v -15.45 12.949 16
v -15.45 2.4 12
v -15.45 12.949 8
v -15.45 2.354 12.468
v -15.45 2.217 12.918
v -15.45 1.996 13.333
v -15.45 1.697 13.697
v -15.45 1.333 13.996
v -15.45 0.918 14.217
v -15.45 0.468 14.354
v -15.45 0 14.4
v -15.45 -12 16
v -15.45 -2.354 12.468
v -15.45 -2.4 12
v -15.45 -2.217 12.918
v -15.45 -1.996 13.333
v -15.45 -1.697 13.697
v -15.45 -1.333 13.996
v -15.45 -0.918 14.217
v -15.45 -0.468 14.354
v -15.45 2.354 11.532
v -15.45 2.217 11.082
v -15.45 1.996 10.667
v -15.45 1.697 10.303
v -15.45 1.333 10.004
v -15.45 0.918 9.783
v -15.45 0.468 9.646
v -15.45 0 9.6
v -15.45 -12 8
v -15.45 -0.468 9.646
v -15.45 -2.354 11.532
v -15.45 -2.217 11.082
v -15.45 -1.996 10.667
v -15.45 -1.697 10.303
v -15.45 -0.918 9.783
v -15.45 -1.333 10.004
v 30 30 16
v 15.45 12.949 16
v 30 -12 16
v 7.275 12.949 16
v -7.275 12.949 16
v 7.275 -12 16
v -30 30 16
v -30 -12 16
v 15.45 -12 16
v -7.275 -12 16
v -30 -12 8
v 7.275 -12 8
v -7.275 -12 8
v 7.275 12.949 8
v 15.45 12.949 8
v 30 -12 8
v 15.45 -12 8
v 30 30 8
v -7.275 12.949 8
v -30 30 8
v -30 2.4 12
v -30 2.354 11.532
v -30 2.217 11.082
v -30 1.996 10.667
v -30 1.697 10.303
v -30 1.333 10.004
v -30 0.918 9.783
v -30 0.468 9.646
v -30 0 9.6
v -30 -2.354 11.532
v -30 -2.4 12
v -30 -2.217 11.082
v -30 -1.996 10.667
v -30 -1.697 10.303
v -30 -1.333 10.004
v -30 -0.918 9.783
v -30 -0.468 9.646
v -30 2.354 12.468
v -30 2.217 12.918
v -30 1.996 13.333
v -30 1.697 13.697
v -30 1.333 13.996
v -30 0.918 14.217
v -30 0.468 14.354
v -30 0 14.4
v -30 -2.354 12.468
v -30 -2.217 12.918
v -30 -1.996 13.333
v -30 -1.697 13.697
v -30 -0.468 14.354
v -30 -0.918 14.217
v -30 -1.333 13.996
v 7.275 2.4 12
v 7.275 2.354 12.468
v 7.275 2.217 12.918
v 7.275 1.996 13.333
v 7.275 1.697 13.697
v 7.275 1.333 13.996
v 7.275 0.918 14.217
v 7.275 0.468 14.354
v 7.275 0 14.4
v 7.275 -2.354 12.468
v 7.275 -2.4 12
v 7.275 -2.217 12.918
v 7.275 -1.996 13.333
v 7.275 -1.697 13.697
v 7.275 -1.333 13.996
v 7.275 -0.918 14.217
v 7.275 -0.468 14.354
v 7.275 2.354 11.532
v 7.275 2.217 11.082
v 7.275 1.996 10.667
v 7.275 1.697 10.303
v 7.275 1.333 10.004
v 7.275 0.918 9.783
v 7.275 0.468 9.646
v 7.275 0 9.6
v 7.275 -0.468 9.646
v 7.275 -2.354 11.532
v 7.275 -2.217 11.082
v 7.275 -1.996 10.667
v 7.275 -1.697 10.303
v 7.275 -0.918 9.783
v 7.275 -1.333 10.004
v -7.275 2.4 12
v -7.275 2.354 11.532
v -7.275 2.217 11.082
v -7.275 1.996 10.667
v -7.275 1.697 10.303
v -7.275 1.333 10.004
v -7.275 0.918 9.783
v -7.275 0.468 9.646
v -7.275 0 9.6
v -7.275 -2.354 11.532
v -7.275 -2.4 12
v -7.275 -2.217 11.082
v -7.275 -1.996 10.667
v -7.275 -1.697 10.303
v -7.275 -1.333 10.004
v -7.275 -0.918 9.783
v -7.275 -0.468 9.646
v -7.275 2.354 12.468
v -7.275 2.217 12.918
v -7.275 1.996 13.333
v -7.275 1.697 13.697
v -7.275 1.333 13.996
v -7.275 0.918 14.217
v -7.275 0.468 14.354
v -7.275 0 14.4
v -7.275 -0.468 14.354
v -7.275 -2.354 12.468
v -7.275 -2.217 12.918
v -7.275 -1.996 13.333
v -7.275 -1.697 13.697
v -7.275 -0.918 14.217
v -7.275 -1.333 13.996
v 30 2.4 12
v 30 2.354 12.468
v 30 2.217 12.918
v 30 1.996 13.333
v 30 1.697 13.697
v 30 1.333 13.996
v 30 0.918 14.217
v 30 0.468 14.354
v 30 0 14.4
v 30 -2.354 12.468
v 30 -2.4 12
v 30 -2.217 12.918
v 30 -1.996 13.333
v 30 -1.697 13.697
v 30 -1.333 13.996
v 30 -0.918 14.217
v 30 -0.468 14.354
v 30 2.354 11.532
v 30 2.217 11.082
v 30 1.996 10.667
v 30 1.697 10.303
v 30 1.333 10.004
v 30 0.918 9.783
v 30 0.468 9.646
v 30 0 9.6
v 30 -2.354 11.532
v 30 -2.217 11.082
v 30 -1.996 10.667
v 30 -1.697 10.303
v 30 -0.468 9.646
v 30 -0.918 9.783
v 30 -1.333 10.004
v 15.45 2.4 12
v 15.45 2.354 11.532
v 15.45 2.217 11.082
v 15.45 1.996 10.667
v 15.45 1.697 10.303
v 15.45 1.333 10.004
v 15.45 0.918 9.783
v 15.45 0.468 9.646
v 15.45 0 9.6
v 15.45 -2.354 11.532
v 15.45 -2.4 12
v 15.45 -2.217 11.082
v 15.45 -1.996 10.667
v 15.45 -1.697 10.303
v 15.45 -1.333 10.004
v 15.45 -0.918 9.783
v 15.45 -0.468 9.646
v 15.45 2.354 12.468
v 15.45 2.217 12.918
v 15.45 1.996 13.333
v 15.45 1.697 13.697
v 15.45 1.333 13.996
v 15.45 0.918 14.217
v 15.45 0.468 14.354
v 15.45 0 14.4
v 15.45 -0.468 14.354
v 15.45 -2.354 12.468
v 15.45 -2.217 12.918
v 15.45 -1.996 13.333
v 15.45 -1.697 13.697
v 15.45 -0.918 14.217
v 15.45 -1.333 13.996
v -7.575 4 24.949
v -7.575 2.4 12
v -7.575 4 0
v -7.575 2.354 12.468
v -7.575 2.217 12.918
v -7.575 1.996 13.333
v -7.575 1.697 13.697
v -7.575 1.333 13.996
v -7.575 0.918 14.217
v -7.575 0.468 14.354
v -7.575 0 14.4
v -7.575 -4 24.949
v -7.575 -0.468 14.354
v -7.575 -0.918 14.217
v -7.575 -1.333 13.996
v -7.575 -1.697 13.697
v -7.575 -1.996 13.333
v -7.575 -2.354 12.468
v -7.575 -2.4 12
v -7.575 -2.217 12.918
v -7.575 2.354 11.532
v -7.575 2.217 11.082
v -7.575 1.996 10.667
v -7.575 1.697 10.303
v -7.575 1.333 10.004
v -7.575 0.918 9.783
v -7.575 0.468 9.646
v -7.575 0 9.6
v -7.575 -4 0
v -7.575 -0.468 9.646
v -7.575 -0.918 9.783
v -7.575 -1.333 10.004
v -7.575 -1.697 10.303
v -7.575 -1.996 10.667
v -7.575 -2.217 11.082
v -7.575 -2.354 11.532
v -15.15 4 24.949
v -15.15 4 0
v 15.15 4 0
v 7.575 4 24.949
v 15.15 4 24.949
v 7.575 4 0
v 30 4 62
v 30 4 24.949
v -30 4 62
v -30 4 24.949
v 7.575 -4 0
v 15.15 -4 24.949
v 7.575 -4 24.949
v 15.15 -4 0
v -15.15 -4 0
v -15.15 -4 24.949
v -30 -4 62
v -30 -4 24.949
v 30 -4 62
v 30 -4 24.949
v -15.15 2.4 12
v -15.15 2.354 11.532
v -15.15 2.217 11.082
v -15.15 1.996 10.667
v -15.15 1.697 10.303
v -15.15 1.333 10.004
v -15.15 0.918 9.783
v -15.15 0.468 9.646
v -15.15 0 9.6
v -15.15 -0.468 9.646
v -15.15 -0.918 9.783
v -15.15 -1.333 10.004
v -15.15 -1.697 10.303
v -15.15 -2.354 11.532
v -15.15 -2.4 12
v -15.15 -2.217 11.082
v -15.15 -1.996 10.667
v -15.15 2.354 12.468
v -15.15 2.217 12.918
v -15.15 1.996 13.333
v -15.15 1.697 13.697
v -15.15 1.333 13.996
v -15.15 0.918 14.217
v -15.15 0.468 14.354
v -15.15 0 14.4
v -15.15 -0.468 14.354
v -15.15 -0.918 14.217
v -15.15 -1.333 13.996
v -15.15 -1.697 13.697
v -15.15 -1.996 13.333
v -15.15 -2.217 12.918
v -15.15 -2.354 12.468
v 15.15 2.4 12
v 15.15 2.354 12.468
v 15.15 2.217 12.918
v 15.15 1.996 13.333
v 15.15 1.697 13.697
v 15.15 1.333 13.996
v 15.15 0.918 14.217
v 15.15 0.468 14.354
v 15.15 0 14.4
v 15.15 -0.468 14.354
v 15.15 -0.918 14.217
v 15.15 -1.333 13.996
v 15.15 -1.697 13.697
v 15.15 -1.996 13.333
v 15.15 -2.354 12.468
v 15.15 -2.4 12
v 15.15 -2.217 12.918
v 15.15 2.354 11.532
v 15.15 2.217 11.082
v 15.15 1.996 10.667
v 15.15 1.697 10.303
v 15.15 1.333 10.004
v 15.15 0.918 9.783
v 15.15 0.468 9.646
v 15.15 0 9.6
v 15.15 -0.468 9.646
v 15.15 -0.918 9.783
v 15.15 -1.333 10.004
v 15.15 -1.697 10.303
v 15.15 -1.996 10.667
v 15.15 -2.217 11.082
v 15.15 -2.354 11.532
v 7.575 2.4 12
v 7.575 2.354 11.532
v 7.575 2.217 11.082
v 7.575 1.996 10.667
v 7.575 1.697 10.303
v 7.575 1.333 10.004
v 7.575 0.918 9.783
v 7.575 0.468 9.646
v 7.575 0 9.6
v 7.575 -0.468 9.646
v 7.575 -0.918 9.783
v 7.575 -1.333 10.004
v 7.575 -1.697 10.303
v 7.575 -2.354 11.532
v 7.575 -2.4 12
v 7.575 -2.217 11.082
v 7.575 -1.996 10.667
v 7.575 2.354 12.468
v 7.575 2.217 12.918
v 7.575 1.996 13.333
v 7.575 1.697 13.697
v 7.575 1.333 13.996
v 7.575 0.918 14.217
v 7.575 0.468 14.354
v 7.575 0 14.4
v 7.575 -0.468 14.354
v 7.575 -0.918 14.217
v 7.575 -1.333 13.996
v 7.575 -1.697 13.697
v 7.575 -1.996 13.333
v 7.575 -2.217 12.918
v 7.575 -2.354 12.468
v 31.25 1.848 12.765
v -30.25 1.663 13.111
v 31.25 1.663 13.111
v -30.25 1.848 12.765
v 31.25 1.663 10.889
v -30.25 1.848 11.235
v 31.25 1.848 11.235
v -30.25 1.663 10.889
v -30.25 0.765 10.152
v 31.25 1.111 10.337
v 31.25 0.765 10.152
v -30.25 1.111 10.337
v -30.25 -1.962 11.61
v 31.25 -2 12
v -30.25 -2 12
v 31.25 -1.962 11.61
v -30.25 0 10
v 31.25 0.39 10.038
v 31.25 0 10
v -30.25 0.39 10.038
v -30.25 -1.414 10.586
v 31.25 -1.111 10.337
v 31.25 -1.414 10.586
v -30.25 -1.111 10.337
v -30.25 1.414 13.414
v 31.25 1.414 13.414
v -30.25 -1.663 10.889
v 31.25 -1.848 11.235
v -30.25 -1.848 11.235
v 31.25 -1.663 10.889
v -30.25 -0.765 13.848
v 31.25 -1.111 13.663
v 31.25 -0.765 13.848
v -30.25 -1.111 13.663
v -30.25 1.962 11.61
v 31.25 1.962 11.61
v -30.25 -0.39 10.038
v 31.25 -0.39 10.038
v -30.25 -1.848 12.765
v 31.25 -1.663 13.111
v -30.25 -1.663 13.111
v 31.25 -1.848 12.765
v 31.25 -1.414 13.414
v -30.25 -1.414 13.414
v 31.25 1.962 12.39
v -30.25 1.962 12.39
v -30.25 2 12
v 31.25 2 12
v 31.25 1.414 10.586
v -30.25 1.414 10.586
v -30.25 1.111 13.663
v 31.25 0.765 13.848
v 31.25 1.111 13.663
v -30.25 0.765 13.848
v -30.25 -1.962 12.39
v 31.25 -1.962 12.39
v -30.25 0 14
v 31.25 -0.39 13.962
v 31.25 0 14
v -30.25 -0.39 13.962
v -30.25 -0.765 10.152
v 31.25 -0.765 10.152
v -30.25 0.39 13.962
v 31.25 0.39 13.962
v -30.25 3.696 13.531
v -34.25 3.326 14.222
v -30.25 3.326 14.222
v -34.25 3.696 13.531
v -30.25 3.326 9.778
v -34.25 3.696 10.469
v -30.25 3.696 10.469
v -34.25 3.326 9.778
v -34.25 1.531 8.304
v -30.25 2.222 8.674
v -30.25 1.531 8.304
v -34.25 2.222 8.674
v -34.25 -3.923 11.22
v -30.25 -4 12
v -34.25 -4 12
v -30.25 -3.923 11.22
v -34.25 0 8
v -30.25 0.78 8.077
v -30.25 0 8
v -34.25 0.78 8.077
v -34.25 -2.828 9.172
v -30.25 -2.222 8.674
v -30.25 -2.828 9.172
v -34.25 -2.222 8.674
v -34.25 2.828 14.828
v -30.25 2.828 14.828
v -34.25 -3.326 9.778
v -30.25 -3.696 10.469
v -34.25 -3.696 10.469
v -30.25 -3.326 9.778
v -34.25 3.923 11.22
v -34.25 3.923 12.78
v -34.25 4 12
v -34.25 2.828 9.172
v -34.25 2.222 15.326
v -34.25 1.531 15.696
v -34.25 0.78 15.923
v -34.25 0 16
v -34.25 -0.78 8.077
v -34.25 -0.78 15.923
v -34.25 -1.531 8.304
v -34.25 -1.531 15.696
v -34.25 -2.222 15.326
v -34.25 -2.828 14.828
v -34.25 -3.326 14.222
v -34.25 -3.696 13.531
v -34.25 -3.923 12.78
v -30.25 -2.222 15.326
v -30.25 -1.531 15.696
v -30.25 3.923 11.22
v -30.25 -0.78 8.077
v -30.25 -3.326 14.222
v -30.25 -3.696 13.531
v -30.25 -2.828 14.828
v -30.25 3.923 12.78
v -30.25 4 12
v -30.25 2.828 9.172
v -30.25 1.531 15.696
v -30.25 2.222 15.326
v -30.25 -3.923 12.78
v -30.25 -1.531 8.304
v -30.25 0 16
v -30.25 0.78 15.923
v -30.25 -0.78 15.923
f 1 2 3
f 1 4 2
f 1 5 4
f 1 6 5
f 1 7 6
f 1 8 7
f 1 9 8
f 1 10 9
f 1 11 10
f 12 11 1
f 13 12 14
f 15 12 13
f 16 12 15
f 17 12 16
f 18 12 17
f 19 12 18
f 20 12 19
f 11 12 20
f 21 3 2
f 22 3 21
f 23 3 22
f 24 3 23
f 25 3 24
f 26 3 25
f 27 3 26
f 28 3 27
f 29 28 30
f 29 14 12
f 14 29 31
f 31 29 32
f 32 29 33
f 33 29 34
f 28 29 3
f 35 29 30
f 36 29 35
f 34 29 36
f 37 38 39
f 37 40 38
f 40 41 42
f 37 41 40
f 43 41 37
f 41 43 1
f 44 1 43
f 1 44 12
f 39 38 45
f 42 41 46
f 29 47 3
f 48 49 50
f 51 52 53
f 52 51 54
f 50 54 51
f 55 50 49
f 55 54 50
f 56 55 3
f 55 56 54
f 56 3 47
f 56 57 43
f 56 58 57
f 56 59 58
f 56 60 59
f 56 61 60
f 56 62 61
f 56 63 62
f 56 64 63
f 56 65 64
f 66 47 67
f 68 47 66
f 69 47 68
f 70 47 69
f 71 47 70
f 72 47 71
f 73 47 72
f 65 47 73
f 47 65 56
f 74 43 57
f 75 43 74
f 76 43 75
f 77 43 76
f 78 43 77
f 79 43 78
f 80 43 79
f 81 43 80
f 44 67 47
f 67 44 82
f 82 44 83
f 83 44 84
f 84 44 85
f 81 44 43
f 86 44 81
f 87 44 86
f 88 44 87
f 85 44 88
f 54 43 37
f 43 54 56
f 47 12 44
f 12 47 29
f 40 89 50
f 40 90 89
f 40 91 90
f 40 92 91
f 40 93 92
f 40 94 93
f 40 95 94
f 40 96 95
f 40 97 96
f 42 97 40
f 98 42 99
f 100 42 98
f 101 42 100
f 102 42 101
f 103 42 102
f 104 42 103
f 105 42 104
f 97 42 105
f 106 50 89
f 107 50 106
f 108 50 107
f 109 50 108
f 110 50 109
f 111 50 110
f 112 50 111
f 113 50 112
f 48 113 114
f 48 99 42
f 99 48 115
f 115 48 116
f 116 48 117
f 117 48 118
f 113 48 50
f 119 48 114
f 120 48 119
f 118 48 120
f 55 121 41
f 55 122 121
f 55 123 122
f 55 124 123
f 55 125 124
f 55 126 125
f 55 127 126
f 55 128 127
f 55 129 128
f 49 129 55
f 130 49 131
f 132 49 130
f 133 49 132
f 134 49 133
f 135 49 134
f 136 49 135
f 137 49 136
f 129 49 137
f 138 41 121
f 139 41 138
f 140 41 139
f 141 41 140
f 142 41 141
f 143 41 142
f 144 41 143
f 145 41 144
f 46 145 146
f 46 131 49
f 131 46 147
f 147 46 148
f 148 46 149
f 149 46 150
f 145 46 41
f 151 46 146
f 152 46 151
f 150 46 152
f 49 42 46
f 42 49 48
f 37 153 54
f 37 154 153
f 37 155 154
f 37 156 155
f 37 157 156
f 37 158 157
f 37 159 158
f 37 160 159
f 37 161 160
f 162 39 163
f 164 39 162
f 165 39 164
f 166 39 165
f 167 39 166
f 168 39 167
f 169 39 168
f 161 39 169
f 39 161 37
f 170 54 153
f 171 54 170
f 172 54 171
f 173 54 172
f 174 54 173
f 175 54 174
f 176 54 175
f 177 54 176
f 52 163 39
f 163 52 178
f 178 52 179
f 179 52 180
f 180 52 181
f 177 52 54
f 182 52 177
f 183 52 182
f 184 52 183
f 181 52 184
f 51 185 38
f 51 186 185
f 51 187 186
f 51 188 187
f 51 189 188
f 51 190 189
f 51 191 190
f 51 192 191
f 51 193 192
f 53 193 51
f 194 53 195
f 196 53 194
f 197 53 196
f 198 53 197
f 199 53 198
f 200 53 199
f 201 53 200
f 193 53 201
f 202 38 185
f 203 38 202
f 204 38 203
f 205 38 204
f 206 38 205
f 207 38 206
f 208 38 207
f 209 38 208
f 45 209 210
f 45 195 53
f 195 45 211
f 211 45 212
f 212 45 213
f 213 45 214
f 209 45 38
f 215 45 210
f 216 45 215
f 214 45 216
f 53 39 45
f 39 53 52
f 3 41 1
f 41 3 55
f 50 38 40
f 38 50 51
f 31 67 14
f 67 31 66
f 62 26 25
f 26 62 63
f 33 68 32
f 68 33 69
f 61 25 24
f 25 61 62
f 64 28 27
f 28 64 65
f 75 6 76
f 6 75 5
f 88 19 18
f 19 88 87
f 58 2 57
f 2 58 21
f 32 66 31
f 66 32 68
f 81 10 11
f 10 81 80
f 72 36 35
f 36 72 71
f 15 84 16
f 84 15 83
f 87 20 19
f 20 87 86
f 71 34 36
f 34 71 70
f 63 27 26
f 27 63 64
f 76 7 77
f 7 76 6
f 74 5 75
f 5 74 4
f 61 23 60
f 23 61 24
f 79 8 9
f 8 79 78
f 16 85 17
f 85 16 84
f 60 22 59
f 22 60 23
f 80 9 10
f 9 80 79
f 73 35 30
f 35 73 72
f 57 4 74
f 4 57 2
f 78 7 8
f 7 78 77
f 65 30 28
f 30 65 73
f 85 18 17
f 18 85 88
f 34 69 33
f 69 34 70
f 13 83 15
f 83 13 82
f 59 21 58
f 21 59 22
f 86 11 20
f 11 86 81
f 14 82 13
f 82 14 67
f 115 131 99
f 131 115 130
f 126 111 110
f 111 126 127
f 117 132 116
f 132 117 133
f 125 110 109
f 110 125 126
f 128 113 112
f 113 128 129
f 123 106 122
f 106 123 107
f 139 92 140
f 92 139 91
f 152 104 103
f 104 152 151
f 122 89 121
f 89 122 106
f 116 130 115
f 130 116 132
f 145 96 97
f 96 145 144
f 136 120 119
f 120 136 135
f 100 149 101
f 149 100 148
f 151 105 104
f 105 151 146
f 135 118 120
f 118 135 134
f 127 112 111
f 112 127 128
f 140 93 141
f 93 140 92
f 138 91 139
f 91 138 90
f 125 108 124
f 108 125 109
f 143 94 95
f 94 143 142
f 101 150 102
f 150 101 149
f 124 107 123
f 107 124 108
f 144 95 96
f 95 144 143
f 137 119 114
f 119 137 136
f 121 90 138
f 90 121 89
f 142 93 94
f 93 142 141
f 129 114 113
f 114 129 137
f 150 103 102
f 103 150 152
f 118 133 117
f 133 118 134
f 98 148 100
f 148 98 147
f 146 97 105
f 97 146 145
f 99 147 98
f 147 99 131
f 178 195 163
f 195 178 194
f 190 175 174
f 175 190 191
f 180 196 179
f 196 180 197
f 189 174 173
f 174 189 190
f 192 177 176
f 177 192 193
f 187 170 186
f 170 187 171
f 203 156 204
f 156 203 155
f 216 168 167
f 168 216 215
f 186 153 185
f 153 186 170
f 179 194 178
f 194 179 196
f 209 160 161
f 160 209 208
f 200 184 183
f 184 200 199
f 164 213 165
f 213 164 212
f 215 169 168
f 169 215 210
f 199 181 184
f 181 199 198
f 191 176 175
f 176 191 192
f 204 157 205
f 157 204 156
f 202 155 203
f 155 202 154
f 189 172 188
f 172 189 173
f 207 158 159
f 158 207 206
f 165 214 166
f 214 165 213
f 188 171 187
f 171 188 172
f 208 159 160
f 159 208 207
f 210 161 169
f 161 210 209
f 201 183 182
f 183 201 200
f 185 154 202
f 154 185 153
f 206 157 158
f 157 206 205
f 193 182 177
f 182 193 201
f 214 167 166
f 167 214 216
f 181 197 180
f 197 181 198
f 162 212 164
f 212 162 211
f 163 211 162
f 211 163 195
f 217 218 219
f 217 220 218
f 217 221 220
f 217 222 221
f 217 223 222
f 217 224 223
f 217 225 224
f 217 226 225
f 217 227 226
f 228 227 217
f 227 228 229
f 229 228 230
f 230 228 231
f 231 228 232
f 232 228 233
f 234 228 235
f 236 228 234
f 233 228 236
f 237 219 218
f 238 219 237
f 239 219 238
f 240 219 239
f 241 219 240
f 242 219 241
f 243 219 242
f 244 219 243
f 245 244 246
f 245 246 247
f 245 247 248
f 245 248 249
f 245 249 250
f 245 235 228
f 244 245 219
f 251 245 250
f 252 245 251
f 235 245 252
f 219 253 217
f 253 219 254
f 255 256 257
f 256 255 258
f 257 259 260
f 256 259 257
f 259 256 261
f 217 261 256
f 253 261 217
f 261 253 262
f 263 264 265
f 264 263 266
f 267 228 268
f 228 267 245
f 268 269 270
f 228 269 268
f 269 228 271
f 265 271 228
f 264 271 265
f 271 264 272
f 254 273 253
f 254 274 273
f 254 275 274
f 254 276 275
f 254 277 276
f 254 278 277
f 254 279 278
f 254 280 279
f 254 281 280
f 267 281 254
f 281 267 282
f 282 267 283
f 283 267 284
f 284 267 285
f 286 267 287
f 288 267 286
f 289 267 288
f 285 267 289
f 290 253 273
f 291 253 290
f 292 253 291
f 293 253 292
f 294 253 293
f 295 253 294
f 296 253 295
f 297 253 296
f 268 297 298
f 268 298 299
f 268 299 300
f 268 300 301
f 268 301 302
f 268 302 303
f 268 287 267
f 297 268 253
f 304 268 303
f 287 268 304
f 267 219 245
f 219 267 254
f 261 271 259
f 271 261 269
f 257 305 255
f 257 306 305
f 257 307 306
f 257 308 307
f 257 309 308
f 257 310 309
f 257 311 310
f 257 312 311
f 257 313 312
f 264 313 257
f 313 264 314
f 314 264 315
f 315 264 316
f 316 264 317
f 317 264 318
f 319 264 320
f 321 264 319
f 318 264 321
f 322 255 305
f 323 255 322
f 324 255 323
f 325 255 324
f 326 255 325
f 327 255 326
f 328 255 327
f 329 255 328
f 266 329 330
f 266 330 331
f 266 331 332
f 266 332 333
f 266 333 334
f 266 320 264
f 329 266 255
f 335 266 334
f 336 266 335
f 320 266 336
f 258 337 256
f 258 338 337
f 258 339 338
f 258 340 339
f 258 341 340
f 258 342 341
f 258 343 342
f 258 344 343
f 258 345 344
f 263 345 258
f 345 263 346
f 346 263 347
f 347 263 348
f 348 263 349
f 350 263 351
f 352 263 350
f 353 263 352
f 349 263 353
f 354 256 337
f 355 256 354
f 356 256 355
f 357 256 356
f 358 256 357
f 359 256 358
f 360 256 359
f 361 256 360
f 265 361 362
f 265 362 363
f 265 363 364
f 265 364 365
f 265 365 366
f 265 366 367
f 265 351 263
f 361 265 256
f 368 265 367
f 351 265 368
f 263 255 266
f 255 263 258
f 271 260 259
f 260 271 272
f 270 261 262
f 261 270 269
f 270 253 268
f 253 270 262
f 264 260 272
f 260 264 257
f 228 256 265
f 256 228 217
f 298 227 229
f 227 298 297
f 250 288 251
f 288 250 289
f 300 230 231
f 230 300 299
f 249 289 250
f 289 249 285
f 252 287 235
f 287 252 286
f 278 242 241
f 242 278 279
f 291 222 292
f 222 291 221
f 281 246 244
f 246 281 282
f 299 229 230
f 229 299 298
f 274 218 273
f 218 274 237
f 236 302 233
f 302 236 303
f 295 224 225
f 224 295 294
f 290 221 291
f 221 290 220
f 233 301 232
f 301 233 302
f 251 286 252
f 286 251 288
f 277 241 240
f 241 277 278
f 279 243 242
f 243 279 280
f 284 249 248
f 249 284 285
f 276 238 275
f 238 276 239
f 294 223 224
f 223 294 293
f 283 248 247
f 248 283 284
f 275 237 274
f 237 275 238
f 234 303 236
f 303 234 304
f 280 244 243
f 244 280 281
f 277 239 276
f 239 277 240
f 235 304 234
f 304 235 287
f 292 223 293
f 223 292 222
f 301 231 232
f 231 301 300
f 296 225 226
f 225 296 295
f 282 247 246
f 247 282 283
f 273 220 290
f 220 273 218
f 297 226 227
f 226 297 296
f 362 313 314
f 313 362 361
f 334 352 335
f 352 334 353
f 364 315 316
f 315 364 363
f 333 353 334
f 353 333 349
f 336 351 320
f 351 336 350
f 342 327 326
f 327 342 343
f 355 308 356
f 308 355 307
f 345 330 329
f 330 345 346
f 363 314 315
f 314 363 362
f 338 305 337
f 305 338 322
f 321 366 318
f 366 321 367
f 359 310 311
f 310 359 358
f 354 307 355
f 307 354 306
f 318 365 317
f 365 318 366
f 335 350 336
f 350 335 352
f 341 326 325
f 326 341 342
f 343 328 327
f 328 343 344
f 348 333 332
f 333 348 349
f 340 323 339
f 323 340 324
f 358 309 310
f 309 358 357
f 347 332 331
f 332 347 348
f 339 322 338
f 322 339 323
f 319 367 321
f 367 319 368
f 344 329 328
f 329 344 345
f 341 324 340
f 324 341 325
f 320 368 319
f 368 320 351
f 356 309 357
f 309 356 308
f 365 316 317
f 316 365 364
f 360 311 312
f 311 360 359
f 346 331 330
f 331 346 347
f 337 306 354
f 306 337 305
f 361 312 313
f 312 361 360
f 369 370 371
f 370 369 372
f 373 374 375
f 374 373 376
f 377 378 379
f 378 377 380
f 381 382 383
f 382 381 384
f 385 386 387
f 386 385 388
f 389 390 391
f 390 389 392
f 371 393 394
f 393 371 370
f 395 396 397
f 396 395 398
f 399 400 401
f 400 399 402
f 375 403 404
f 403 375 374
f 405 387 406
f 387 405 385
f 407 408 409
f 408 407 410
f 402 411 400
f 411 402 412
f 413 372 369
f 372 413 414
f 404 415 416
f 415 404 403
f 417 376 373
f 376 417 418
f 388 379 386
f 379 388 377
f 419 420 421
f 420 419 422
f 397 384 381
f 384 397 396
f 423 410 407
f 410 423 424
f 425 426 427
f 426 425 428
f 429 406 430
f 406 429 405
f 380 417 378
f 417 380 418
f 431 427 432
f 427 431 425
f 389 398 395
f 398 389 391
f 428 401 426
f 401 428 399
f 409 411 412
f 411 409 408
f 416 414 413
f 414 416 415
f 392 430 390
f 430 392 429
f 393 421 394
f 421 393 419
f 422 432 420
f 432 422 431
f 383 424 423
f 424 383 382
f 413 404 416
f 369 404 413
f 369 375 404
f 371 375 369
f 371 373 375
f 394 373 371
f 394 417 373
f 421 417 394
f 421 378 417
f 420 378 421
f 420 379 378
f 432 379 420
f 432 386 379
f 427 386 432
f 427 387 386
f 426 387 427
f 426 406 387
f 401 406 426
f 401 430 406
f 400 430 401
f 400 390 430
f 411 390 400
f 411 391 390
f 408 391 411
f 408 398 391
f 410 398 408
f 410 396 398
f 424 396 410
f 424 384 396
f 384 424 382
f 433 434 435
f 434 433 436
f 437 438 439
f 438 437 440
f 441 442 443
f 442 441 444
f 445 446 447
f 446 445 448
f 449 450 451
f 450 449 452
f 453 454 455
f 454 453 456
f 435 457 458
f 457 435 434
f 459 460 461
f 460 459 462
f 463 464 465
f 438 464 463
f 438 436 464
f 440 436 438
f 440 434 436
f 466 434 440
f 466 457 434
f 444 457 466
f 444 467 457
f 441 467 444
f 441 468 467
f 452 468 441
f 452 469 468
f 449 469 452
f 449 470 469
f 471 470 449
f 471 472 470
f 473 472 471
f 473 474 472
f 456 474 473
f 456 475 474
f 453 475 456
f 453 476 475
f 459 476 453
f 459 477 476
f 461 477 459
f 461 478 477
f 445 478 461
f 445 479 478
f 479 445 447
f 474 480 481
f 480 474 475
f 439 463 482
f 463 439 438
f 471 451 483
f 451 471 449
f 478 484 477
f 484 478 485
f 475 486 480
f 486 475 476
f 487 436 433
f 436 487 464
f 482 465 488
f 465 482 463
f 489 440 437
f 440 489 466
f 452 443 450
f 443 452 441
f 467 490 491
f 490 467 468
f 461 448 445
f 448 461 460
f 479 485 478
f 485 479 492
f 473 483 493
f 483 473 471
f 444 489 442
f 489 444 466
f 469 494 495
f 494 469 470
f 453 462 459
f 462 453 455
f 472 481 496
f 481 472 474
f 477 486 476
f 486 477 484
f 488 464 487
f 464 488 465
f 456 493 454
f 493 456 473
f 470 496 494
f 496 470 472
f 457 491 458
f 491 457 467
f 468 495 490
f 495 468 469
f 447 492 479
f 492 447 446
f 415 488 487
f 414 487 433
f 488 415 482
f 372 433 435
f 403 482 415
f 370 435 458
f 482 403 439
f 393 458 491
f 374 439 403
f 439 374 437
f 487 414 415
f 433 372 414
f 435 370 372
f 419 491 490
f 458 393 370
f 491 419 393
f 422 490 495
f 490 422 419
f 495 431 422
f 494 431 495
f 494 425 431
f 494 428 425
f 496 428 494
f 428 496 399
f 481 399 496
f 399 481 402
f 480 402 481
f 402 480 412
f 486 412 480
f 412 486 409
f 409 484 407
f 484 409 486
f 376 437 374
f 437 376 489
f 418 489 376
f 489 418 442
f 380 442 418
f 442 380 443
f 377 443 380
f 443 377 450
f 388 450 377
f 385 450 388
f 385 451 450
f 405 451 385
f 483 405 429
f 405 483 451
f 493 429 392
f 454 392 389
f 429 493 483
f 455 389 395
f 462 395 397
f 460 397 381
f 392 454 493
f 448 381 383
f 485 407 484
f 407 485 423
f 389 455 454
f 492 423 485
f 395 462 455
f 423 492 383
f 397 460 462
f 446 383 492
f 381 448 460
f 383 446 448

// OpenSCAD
$fn = 32;

// ------------------------------------------------------------------------
// Butt hinge: hinge 60 mm, leaf swung 270 deg
// Every part is its own module, assembly() places every instance.
// ------------------------------------------------------------------------

// --- part 1 ---
module hinge_base() {
  difference() {
    union() {
      translate([-30, -12, -4]) cube([14.55, 42, 8]);
      translate([-7.275, -12, -4]) cube([14.55, 42, 8]);
      translate([15.45, -12, -4]) cube([14.55, 42, 8]);
      translate([-30, 12.949, -4]) cube([60, 17.051, 8]);
    }
    translate([-22.725, 0, 0]) rotate([0, 90, 0]) cylinder(h = 16.55, d = 4.8, center = true);
    translate([0, 0, 0]) rotate([0, 90, 0]) cylinder(h = 16.55, d = 4.8, center = true);
    translate([22.725, 0, 0]) rotate([0, 90, 0]) cylinder(h = 16.55, d = 4.8, center = true);
  }
}

// --- part 2 ---
module hinge_mover() {
  difference() {
    union() {
      translate([-15.15, -50, -4]) cube([7.575, 62, 8]);
      translate([7.575, -50, -4]) cube([7.575, 62, 8]);
      translate([-30, -50, -4]) cube([60, 37.051, 8]);
    }
    translate([-11.362, 0, 0]) rotate([0, 90, 0]) cylinder(h = 9.575, d = 4.8, center = true);
    translate([11.362, 0, 0]) rotate([0, 90, 0]) cylinder(h = 9.575, d = 4.8, center = true);
  }
}

// --- part 3 ---
module hinge_pin() {
  rotate([0, 90, 0]) cylinder(h = 62.5, d = 4, center = true);
  translate([-34.25, 0, 0]) rotate([0, 90, 0]) cylinder(h = 4, d = 8);
}

// --- assembly ---
module assembly() {
  color([0.80, 0.24, 0.20]) translate([0, 0, 12]) rotate([0, 0, 0]) hinge_base();
  color([0.20, 0.45, 0.75]) translate([0, 0, 12]) rotate([270, 0, 0]) hinge_mover();
  color([0.25, 0.62, 0.32]) translate([0, 0, 12]) rotate([0, 0, 0]) hinge_pin();
}

assembly();
